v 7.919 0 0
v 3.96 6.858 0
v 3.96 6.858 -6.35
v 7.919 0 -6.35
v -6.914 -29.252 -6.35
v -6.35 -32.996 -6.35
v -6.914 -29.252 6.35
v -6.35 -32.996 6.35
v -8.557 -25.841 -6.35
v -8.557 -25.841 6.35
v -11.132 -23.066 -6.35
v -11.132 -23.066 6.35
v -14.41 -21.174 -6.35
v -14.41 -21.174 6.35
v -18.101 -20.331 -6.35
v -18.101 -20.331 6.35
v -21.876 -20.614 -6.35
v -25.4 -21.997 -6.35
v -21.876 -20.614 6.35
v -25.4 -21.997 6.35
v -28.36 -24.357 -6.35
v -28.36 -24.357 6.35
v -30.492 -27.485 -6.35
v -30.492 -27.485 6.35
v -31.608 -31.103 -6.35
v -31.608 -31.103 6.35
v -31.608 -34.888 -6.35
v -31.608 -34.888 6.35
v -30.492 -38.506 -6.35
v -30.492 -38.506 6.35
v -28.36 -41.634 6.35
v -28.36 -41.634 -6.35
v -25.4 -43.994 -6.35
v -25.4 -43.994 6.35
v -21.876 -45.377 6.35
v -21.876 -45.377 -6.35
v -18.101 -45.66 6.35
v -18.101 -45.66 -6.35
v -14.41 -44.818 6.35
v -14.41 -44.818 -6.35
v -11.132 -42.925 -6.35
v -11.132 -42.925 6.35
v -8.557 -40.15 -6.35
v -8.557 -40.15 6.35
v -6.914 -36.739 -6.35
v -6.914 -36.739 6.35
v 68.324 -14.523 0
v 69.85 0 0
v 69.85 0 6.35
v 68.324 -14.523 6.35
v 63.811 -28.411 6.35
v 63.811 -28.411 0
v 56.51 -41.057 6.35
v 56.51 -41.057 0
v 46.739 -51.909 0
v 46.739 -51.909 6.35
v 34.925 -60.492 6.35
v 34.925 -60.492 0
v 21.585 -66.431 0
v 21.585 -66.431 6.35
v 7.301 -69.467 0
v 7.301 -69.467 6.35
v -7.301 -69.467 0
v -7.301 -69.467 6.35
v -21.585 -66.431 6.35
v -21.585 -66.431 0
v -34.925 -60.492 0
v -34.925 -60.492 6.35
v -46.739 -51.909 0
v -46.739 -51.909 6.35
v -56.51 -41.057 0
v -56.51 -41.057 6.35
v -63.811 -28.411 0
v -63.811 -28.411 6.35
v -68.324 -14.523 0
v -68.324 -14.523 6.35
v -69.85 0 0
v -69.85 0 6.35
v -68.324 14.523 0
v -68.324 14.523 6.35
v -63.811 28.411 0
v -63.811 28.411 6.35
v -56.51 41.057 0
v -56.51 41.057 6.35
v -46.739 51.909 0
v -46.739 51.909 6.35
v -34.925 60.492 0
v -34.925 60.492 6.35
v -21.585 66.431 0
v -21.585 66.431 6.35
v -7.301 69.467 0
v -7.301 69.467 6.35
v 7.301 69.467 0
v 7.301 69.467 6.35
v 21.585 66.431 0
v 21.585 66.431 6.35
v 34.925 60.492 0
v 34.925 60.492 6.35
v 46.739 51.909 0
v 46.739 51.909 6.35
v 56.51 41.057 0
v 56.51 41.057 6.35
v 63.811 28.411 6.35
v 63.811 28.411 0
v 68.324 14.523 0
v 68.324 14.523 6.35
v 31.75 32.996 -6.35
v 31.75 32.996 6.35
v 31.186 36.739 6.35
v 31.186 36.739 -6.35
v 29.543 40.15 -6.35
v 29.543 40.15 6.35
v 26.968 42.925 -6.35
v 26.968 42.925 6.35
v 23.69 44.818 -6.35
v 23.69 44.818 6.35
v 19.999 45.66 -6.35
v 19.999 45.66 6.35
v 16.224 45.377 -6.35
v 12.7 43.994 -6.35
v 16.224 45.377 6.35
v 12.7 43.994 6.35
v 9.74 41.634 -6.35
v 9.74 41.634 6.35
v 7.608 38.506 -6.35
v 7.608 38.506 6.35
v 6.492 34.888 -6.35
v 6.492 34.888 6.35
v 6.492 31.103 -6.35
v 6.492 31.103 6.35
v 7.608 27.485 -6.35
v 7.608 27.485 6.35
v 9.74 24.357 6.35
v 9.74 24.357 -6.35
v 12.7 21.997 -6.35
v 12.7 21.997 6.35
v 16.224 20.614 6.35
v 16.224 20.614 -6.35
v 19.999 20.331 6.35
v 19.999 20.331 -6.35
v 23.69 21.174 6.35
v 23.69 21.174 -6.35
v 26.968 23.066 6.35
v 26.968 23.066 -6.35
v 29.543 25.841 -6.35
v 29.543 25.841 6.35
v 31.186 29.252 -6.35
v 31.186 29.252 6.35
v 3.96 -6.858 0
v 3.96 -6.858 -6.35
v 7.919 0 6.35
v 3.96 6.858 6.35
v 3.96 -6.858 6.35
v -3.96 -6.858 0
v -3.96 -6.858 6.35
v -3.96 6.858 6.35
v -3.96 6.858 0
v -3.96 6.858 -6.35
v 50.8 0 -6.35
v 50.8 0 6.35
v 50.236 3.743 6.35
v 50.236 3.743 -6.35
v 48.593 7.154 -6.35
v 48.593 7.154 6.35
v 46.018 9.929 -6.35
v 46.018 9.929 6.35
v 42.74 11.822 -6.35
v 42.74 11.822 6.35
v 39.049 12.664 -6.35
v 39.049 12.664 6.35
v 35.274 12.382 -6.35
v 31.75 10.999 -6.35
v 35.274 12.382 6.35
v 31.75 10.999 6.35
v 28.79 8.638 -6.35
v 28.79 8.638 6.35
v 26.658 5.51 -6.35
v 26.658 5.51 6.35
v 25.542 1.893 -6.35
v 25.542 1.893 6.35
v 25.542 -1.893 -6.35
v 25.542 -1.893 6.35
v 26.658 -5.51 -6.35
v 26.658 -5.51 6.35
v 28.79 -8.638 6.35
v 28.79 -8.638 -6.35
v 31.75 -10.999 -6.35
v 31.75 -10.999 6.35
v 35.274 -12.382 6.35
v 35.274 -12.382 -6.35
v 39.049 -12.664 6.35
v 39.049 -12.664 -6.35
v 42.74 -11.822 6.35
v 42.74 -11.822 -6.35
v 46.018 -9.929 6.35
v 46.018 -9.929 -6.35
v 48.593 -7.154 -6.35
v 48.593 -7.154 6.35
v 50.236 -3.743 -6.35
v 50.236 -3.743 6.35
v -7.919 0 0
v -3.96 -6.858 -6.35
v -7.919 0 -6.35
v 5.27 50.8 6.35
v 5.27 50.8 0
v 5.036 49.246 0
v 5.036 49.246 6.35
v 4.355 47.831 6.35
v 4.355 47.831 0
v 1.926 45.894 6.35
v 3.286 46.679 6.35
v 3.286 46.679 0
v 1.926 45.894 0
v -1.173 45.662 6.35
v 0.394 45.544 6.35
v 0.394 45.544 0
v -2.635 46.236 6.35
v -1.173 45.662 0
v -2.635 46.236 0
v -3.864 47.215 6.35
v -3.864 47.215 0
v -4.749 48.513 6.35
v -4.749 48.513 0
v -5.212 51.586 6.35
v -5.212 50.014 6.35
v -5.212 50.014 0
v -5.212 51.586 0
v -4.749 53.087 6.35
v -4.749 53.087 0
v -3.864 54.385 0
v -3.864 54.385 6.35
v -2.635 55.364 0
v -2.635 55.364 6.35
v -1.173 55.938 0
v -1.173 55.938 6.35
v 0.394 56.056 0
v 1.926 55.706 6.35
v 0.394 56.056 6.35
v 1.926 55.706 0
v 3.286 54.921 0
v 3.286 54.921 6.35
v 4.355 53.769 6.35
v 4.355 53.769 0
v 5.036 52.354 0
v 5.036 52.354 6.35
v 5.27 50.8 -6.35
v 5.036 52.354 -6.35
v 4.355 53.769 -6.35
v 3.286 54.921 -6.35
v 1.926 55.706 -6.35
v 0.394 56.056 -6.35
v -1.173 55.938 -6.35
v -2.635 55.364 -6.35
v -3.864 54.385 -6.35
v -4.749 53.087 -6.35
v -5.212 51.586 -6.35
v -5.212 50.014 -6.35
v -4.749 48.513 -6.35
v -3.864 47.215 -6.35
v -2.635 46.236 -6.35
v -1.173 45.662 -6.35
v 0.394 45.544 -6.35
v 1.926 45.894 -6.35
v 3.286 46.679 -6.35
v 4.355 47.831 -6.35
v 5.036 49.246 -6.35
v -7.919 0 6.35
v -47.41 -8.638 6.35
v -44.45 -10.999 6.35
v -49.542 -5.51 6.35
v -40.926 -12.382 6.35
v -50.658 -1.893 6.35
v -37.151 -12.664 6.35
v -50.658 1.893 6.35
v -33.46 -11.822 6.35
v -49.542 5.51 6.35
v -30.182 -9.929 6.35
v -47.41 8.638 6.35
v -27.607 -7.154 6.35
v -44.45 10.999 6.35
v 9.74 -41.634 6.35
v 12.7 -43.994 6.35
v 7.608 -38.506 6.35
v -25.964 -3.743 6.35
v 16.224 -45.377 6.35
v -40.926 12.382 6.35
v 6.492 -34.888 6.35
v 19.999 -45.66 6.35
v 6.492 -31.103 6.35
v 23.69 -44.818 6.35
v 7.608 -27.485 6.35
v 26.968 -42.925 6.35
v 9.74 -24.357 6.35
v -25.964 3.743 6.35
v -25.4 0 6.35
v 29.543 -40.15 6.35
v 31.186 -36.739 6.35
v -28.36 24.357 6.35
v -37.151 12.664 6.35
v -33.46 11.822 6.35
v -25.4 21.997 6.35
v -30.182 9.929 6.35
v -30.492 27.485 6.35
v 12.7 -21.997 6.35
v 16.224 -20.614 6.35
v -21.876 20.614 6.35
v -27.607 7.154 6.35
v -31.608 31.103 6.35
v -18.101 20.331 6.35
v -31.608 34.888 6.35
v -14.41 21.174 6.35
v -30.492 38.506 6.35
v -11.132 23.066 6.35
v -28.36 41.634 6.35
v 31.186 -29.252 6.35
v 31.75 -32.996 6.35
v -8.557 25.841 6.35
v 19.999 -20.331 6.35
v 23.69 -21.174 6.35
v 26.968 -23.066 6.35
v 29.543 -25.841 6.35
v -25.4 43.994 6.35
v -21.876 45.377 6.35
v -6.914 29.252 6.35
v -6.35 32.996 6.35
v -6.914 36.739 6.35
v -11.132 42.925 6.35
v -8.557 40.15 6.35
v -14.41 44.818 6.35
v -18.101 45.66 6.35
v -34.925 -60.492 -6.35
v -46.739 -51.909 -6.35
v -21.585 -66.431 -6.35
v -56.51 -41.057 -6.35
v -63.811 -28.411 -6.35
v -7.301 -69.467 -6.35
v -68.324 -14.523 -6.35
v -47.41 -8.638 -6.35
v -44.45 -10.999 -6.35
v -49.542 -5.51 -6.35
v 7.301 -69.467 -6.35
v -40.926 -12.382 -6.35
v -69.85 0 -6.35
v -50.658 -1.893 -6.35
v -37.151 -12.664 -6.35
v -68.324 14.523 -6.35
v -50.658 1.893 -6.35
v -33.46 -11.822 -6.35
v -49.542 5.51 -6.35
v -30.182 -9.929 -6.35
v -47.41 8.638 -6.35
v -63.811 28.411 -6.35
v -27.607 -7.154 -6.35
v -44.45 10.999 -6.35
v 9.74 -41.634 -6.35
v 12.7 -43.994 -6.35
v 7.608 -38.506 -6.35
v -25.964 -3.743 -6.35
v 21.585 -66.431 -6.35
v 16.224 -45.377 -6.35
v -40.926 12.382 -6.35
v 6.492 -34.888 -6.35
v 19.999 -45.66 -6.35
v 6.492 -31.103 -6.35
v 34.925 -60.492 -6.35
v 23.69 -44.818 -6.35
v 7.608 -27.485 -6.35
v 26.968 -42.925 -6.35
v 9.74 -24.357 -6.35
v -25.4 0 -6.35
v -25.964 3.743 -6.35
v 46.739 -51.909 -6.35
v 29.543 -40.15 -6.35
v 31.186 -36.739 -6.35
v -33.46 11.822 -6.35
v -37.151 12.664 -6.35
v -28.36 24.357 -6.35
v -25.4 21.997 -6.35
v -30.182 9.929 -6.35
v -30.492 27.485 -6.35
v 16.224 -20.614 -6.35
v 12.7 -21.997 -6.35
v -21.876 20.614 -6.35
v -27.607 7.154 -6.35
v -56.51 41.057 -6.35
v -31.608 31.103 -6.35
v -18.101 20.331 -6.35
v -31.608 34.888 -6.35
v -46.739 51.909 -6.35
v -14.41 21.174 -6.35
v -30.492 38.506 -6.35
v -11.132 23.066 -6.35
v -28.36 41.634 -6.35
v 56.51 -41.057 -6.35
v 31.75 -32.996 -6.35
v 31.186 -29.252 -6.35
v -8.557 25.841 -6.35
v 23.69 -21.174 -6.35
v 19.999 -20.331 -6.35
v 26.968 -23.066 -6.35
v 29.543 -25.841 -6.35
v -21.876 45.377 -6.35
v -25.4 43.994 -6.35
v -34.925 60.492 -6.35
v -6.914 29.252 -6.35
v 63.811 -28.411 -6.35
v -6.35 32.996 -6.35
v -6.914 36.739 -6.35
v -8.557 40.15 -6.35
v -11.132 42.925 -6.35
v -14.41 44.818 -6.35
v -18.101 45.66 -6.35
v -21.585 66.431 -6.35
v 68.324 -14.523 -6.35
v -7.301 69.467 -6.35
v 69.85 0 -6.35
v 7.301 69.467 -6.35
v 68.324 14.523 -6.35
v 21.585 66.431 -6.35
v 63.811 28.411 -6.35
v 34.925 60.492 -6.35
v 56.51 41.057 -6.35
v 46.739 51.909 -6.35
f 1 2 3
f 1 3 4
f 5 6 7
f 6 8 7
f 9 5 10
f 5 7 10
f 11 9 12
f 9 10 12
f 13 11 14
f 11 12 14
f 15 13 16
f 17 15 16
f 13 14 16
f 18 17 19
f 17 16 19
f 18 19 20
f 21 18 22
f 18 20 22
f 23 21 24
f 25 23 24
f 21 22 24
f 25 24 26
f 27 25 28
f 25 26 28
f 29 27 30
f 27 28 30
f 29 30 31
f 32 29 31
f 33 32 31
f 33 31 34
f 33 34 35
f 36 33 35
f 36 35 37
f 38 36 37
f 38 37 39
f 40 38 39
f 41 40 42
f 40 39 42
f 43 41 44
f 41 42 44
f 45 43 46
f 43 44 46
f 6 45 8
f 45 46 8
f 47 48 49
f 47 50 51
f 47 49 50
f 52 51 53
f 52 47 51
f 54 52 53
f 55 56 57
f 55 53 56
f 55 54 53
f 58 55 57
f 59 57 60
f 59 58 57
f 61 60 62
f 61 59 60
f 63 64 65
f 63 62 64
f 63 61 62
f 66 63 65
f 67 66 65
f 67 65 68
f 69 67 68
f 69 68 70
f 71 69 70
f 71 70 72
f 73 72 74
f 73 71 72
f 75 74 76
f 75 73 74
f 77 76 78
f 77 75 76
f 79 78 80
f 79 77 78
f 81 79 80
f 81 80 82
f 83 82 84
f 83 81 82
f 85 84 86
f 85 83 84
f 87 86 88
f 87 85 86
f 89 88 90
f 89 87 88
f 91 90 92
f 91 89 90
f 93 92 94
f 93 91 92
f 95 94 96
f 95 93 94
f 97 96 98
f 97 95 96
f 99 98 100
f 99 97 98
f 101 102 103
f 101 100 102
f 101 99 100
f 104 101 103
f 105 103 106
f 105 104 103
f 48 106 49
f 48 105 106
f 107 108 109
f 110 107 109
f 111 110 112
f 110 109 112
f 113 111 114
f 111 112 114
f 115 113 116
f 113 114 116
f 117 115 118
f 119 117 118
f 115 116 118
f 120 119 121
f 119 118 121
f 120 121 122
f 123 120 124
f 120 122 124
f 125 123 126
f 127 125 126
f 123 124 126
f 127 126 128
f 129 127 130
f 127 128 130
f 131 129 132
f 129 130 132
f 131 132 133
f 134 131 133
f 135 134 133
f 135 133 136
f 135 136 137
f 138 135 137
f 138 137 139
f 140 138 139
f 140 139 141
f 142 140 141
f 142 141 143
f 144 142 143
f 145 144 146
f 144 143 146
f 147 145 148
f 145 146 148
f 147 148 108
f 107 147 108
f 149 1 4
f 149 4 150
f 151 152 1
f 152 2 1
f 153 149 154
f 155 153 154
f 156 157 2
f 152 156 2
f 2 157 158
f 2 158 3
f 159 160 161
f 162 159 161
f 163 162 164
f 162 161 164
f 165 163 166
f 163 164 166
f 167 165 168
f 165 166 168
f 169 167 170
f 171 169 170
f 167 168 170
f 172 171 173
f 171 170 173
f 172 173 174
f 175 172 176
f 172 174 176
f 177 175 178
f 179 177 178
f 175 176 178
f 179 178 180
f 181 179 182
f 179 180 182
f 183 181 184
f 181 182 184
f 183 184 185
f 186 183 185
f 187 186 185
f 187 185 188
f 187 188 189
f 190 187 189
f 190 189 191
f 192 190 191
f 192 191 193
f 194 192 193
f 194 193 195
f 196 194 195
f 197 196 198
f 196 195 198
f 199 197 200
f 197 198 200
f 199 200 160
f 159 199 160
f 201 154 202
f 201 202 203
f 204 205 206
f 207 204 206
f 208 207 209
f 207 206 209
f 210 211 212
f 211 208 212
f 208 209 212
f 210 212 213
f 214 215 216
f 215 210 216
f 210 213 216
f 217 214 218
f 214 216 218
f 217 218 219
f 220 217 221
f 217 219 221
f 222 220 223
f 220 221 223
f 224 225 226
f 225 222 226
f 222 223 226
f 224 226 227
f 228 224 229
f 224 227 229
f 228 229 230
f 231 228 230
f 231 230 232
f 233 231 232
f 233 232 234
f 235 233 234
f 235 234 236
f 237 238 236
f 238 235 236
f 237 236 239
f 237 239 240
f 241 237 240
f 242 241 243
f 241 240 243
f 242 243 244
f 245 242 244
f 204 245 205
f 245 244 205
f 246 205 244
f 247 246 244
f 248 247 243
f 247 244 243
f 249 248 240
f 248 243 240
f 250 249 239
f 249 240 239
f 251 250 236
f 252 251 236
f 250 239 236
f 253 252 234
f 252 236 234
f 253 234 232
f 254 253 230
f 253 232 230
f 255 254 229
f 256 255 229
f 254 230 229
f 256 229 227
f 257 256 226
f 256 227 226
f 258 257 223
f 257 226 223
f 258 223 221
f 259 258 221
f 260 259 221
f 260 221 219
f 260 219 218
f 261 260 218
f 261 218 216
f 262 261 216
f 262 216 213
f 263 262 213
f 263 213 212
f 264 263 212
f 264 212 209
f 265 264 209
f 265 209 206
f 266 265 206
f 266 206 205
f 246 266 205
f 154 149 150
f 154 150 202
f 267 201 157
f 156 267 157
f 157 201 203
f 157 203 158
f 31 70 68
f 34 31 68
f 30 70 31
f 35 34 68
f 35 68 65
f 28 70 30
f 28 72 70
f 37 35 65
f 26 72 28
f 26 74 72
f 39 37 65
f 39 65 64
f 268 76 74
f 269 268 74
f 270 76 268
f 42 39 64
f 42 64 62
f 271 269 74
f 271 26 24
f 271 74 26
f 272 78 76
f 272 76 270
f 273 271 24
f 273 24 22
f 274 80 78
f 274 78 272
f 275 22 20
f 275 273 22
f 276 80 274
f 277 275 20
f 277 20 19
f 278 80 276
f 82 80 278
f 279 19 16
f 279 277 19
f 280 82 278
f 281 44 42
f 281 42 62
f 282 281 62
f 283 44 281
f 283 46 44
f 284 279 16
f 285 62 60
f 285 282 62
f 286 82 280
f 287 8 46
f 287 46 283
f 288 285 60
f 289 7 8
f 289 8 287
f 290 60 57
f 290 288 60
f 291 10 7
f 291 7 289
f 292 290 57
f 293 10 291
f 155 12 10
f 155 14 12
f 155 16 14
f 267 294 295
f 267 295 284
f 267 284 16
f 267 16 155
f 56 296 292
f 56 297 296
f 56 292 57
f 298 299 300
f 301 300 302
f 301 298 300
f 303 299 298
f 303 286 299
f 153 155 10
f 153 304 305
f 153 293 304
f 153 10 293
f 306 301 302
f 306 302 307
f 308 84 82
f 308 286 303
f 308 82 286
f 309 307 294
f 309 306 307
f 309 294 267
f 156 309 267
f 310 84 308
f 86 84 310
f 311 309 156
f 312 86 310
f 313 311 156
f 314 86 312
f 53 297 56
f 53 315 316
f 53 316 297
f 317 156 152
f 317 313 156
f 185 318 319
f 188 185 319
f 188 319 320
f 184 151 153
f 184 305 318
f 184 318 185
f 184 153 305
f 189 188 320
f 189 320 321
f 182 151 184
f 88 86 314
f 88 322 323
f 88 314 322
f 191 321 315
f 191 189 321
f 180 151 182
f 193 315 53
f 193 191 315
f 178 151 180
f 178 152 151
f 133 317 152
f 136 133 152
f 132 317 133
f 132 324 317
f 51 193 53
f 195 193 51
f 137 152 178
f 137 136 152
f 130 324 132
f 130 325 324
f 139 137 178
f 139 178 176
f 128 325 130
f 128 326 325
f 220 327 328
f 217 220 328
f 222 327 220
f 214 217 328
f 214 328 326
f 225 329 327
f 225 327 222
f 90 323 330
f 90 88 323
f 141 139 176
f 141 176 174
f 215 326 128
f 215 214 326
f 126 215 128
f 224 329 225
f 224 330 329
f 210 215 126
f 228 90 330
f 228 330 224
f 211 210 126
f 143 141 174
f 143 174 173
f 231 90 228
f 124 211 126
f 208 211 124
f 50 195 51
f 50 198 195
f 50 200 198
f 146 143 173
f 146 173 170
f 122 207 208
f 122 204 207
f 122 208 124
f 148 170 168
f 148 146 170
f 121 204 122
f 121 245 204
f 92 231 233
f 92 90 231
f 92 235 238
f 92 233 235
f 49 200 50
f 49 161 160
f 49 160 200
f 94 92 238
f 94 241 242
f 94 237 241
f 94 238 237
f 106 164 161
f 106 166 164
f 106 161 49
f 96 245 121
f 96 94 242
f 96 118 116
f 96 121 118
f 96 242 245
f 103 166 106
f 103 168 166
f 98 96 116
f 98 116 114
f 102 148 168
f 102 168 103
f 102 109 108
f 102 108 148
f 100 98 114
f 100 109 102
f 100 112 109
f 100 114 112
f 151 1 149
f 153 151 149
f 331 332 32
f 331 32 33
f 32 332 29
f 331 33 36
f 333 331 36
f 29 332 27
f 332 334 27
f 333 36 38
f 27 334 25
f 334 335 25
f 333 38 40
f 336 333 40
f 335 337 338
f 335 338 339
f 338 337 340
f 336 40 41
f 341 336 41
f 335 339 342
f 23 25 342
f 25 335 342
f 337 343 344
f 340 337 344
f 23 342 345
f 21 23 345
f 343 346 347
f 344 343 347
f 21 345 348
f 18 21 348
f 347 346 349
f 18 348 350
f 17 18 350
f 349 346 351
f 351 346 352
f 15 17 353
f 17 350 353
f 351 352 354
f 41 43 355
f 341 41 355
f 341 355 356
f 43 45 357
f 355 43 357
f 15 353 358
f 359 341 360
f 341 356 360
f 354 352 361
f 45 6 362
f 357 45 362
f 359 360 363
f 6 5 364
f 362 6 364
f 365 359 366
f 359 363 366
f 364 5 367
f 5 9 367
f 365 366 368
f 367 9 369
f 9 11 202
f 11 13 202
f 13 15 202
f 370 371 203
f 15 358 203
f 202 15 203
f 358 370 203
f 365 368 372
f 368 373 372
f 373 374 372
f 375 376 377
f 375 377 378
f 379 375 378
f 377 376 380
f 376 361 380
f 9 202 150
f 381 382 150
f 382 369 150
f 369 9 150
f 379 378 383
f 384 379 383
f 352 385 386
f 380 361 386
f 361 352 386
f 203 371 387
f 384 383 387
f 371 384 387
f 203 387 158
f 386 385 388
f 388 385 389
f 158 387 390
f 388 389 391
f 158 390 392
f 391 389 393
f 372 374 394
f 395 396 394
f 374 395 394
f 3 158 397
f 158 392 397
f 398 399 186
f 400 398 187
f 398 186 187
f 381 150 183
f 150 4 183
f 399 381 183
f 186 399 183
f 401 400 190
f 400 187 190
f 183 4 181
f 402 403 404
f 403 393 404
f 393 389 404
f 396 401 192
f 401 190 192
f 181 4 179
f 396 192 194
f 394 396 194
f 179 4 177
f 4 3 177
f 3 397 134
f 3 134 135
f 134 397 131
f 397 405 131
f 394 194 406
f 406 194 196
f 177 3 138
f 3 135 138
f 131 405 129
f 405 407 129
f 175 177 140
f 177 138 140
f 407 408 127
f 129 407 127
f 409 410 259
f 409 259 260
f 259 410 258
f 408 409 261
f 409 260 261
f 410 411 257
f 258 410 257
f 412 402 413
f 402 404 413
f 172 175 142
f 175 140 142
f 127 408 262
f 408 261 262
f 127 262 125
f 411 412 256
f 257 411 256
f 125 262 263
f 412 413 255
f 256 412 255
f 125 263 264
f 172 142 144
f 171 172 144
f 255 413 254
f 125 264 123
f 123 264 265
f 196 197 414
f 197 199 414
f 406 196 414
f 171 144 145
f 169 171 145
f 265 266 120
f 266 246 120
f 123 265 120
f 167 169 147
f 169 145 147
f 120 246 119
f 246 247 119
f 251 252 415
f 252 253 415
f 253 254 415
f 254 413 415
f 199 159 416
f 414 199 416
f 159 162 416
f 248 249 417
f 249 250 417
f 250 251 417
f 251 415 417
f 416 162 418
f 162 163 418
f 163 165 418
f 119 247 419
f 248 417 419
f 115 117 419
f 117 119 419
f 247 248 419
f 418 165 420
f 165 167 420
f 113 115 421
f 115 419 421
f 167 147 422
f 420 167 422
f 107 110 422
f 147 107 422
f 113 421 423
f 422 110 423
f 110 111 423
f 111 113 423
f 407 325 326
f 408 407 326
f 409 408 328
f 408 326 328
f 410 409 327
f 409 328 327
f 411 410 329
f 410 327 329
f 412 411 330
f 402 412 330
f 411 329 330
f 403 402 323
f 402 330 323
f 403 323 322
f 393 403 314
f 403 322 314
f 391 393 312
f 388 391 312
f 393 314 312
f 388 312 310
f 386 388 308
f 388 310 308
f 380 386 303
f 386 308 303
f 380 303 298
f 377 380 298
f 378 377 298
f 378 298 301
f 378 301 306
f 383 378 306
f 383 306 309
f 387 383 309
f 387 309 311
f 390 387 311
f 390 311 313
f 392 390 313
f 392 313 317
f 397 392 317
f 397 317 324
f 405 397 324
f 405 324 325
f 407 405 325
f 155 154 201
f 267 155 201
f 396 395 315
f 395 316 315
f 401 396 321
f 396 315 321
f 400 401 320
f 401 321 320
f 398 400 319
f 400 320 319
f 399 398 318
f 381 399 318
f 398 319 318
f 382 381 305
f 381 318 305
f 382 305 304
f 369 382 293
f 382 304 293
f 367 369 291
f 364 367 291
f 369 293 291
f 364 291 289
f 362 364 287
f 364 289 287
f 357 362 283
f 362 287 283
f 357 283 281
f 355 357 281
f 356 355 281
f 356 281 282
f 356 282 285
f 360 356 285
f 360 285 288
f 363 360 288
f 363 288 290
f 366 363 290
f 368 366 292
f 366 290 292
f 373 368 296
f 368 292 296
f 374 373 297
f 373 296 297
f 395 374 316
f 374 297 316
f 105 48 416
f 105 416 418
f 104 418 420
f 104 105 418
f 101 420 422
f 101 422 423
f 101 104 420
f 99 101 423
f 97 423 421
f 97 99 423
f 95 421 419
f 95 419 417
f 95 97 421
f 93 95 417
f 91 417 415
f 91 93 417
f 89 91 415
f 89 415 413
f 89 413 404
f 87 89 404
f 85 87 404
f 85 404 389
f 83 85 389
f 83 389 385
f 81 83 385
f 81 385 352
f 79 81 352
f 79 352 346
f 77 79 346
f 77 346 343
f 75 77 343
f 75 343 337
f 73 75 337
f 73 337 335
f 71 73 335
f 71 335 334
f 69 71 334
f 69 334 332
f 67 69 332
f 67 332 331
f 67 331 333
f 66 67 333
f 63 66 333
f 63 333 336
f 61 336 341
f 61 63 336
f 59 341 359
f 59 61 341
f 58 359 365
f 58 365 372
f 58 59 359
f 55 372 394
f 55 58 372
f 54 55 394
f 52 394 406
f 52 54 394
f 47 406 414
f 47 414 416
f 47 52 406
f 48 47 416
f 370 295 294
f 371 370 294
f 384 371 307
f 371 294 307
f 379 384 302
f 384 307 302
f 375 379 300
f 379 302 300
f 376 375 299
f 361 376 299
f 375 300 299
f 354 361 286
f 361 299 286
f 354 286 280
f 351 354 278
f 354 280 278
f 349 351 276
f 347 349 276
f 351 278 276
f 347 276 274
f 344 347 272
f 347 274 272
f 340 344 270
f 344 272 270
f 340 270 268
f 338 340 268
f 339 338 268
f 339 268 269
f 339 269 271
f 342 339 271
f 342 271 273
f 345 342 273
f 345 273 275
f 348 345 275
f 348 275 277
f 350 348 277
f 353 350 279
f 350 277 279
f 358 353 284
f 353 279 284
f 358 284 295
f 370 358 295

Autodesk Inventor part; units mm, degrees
ref_plane "YZ Plane" through (0, 0, 0) normal (1, 0, 0) x (0, 1, 0)
ref_plane "XZ Plane" through (0, 0, 0) normal (0, 1, 0) x (-1, 0, 0)
ref_plane "XY Plane" through (0, 0, 0) normal (0, 0, 1) x (1, 0, 0)
sketch "Sketch1" plane through (0, 0, 0) normal (0, 0, 1) x (1, 0, 0)
  circle A0 centre (0, 0) radius 69.85
  line L0 (7.9189, 0) -> (3.9595, -6.858)
  line L1 (3.9595, -6.858) -> (-3.9595, -6.858)
  line L2 (-3.9595, -6.858) -> (-7.9189, 0)
  line L3 (-7.9189, 0) -> (-3.9595, 6.858)
  line L4 (-3.9595, 6.858) -> (3.9595, 6.858)
  line L5 (3.9595, 6.858) -> (7.9189, 0)
  circle A1 centre (0, 50.8) radius 5.2705
  dimension "d0" = 139.7
  dimension "d1" = 13.716
  dimension "d2" = 10.541
  dimension "d5" = 50.8
extrude "Extrusion1" add sketch "Sketch1" along normal mid plane 12.7
sketch "Sketch2" plane through (0, 0, 6.35) normal (0, 0, 1) x (1, 0, 0)
  circle A0 centre (-38.1, 0) radius 12.7
  circle A1 centre (-19.05, -32.9956) radius 12.7
  circle A2 centre (19.05, -32.9956) radius 12.7
  circle A3 centre (38.1, 0) radius 12.7
  circle A4 centre (19.05, 32.9956) radius 12.7
  circle A5 centre (-19.05, 32.9956) radius 12.7
  point P0 (0, 0)
  dimension "d6" = 25.4
  dimension "d7" = 38.1
  dimension "d10" = 360
extrude "Extrusion2" cut sketch "Sketch2" against normal through all
properties part number "driveForPiston"
